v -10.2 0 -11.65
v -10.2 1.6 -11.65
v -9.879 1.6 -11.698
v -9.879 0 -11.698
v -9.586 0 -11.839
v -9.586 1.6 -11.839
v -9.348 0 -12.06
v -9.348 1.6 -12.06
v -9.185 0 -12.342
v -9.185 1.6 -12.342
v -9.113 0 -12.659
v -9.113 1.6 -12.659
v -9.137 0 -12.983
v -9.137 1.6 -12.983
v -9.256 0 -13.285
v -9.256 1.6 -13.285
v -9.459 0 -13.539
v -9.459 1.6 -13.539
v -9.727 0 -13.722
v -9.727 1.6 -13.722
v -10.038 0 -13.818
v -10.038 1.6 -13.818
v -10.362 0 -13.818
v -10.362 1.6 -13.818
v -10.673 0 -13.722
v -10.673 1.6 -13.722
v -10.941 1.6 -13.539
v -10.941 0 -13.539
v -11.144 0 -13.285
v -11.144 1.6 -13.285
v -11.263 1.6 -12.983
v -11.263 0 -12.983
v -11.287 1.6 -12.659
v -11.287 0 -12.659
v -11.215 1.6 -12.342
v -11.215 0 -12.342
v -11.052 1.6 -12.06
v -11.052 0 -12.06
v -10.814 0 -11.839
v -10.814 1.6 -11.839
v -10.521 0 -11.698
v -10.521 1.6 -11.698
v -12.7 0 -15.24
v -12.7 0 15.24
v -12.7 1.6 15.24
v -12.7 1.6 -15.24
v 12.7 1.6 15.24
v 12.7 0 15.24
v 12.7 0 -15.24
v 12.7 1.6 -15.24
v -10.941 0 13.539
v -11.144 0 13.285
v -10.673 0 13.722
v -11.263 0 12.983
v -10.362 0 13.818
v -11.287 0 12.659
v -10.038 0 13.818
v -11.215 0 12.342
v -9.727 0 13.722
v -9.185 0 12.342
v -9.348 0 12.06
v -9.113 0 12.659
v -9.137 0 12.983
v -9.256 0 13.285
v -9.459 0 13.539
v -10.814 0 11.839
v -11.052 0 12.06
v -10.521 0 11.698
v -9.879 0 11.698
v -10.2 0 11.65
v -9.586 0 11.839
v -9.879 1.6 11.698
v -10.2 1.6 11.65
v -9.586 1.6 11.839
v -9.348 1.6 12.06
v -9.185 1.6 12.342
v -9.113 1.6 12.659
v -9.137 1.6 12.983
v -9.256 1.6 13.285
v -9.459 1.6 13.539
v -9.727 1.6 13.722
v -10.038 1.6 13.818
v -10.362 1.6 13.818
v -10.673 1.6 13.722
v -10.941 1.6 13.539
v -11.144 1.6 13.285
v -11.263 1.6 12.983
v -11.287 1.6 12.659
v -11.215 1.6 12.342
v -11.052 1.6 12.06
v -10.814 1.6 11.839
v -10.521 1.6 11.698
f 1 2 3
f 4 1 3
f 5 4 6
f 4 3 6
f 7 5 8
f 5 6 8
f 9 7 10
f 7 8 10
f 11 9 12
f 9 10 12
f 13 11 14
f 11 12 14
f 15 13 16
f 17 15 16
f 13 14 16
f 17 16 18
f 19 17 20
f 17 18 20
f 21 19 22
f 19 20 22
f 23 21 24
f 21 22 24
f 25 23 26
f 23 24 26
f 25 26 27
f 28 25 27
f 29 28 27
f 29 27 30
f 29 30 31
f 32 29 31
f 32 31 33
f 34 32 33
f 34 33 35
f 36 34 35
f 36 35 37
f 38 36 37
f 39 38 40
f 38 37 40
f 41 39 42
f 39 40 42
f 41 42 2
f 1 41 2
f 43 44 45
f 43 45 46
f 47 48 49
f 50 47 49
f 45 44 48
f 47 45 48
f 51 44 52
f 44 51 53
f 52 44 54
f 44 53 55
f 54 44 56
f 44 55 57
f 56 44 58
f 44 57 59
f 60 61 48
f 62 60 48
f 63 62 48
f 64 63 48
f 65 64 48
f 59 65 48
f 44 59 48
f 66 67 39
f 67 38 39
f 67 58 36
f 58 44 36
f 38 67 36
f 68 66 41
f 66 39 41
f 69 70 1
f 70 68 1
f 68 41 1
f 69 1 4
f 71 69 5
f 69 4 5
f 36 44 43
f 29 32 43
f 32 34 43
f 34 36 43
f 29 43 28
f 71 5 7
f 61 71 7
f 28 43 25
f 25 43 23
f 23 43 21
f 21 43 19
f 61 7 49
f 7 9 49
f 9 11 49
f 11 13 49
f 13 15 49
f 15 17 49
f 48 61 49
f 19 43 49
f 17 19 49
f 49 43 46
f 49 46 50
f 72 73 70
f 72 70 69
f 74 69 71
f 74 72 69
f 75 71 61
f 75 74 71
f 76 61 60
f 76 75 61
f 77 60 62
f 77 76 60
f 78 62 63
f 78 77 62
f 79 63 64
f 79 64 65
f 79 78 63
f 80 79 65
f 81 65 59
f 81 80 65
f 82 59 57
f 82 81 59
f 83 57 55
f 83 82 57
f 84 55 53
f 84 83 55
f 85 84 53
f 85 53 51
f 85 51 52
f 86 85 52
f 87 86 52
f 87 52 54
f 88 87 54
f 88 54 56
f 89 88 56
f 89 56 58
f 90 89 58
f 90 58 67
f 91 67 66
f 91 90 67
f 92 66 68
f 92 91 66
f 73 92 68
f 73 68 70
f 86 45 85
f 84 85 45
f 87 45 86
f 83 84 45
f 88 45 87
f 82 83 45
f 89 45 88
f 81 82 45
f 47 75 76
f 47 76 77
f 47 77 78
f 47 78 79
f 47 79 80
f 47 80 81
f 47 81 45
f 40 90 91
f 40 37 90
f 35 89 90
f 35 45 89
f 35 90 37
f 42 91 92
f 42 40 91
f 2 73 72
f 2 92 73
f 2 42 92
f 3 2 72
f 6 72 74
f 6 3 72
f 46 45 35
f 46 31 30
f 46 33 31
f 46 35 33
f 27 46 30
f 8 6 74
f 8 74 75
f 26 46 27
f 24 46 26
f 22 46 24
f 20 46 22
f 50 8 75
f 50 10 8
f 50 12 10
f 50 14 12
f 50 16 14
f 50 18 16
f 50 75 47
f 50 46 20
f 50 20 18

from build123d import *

# Parameters (mm, degrees)
SKETCH1_W           = 25.4
SKETCH1_H           = 30.48
BOSS_EXTRUDE1_DEPTH = 1.6
SKETCH2_R           = 1.09
CUT_EXTRUDE1_DEPTH  = 1.6


with BuildPart() as part:
    # Sketch1 → Boss-Extrude1 (new body)
    with BuildSketch(Plane(origin=(0, 0, 0), x_dir=(1, 0, 0), z_dir=(0, 1, 0))):
        Rectangle(SKETCH1_W, SKETCH1_H)
    extrude(amount=BOSS_EXTRUDE1_DEPTH)

    # Sketch2 → Cut-Extrude1 (cut)
    with BuildSketch(Plane(origin=(0, 1.6, 0), x_dir=(1, 0, 0), z_dir=(0, 1, 0))):
        with Locations(Location((-10.2, 12.74, 0), (0, 0, 270))):
            Circle(SKETCH2_R)
    cut_extrude1 = extrude(amount=-CUT_EXTRUDE1_DEPTH, mode=Mode.SUBTRACT)

    # Mirror1: Cut-Extrude1 across plane
    add(cut_extrude1.mirror(Plane.XY), mode=Mode.SUBTRACT)


solid = part.part
